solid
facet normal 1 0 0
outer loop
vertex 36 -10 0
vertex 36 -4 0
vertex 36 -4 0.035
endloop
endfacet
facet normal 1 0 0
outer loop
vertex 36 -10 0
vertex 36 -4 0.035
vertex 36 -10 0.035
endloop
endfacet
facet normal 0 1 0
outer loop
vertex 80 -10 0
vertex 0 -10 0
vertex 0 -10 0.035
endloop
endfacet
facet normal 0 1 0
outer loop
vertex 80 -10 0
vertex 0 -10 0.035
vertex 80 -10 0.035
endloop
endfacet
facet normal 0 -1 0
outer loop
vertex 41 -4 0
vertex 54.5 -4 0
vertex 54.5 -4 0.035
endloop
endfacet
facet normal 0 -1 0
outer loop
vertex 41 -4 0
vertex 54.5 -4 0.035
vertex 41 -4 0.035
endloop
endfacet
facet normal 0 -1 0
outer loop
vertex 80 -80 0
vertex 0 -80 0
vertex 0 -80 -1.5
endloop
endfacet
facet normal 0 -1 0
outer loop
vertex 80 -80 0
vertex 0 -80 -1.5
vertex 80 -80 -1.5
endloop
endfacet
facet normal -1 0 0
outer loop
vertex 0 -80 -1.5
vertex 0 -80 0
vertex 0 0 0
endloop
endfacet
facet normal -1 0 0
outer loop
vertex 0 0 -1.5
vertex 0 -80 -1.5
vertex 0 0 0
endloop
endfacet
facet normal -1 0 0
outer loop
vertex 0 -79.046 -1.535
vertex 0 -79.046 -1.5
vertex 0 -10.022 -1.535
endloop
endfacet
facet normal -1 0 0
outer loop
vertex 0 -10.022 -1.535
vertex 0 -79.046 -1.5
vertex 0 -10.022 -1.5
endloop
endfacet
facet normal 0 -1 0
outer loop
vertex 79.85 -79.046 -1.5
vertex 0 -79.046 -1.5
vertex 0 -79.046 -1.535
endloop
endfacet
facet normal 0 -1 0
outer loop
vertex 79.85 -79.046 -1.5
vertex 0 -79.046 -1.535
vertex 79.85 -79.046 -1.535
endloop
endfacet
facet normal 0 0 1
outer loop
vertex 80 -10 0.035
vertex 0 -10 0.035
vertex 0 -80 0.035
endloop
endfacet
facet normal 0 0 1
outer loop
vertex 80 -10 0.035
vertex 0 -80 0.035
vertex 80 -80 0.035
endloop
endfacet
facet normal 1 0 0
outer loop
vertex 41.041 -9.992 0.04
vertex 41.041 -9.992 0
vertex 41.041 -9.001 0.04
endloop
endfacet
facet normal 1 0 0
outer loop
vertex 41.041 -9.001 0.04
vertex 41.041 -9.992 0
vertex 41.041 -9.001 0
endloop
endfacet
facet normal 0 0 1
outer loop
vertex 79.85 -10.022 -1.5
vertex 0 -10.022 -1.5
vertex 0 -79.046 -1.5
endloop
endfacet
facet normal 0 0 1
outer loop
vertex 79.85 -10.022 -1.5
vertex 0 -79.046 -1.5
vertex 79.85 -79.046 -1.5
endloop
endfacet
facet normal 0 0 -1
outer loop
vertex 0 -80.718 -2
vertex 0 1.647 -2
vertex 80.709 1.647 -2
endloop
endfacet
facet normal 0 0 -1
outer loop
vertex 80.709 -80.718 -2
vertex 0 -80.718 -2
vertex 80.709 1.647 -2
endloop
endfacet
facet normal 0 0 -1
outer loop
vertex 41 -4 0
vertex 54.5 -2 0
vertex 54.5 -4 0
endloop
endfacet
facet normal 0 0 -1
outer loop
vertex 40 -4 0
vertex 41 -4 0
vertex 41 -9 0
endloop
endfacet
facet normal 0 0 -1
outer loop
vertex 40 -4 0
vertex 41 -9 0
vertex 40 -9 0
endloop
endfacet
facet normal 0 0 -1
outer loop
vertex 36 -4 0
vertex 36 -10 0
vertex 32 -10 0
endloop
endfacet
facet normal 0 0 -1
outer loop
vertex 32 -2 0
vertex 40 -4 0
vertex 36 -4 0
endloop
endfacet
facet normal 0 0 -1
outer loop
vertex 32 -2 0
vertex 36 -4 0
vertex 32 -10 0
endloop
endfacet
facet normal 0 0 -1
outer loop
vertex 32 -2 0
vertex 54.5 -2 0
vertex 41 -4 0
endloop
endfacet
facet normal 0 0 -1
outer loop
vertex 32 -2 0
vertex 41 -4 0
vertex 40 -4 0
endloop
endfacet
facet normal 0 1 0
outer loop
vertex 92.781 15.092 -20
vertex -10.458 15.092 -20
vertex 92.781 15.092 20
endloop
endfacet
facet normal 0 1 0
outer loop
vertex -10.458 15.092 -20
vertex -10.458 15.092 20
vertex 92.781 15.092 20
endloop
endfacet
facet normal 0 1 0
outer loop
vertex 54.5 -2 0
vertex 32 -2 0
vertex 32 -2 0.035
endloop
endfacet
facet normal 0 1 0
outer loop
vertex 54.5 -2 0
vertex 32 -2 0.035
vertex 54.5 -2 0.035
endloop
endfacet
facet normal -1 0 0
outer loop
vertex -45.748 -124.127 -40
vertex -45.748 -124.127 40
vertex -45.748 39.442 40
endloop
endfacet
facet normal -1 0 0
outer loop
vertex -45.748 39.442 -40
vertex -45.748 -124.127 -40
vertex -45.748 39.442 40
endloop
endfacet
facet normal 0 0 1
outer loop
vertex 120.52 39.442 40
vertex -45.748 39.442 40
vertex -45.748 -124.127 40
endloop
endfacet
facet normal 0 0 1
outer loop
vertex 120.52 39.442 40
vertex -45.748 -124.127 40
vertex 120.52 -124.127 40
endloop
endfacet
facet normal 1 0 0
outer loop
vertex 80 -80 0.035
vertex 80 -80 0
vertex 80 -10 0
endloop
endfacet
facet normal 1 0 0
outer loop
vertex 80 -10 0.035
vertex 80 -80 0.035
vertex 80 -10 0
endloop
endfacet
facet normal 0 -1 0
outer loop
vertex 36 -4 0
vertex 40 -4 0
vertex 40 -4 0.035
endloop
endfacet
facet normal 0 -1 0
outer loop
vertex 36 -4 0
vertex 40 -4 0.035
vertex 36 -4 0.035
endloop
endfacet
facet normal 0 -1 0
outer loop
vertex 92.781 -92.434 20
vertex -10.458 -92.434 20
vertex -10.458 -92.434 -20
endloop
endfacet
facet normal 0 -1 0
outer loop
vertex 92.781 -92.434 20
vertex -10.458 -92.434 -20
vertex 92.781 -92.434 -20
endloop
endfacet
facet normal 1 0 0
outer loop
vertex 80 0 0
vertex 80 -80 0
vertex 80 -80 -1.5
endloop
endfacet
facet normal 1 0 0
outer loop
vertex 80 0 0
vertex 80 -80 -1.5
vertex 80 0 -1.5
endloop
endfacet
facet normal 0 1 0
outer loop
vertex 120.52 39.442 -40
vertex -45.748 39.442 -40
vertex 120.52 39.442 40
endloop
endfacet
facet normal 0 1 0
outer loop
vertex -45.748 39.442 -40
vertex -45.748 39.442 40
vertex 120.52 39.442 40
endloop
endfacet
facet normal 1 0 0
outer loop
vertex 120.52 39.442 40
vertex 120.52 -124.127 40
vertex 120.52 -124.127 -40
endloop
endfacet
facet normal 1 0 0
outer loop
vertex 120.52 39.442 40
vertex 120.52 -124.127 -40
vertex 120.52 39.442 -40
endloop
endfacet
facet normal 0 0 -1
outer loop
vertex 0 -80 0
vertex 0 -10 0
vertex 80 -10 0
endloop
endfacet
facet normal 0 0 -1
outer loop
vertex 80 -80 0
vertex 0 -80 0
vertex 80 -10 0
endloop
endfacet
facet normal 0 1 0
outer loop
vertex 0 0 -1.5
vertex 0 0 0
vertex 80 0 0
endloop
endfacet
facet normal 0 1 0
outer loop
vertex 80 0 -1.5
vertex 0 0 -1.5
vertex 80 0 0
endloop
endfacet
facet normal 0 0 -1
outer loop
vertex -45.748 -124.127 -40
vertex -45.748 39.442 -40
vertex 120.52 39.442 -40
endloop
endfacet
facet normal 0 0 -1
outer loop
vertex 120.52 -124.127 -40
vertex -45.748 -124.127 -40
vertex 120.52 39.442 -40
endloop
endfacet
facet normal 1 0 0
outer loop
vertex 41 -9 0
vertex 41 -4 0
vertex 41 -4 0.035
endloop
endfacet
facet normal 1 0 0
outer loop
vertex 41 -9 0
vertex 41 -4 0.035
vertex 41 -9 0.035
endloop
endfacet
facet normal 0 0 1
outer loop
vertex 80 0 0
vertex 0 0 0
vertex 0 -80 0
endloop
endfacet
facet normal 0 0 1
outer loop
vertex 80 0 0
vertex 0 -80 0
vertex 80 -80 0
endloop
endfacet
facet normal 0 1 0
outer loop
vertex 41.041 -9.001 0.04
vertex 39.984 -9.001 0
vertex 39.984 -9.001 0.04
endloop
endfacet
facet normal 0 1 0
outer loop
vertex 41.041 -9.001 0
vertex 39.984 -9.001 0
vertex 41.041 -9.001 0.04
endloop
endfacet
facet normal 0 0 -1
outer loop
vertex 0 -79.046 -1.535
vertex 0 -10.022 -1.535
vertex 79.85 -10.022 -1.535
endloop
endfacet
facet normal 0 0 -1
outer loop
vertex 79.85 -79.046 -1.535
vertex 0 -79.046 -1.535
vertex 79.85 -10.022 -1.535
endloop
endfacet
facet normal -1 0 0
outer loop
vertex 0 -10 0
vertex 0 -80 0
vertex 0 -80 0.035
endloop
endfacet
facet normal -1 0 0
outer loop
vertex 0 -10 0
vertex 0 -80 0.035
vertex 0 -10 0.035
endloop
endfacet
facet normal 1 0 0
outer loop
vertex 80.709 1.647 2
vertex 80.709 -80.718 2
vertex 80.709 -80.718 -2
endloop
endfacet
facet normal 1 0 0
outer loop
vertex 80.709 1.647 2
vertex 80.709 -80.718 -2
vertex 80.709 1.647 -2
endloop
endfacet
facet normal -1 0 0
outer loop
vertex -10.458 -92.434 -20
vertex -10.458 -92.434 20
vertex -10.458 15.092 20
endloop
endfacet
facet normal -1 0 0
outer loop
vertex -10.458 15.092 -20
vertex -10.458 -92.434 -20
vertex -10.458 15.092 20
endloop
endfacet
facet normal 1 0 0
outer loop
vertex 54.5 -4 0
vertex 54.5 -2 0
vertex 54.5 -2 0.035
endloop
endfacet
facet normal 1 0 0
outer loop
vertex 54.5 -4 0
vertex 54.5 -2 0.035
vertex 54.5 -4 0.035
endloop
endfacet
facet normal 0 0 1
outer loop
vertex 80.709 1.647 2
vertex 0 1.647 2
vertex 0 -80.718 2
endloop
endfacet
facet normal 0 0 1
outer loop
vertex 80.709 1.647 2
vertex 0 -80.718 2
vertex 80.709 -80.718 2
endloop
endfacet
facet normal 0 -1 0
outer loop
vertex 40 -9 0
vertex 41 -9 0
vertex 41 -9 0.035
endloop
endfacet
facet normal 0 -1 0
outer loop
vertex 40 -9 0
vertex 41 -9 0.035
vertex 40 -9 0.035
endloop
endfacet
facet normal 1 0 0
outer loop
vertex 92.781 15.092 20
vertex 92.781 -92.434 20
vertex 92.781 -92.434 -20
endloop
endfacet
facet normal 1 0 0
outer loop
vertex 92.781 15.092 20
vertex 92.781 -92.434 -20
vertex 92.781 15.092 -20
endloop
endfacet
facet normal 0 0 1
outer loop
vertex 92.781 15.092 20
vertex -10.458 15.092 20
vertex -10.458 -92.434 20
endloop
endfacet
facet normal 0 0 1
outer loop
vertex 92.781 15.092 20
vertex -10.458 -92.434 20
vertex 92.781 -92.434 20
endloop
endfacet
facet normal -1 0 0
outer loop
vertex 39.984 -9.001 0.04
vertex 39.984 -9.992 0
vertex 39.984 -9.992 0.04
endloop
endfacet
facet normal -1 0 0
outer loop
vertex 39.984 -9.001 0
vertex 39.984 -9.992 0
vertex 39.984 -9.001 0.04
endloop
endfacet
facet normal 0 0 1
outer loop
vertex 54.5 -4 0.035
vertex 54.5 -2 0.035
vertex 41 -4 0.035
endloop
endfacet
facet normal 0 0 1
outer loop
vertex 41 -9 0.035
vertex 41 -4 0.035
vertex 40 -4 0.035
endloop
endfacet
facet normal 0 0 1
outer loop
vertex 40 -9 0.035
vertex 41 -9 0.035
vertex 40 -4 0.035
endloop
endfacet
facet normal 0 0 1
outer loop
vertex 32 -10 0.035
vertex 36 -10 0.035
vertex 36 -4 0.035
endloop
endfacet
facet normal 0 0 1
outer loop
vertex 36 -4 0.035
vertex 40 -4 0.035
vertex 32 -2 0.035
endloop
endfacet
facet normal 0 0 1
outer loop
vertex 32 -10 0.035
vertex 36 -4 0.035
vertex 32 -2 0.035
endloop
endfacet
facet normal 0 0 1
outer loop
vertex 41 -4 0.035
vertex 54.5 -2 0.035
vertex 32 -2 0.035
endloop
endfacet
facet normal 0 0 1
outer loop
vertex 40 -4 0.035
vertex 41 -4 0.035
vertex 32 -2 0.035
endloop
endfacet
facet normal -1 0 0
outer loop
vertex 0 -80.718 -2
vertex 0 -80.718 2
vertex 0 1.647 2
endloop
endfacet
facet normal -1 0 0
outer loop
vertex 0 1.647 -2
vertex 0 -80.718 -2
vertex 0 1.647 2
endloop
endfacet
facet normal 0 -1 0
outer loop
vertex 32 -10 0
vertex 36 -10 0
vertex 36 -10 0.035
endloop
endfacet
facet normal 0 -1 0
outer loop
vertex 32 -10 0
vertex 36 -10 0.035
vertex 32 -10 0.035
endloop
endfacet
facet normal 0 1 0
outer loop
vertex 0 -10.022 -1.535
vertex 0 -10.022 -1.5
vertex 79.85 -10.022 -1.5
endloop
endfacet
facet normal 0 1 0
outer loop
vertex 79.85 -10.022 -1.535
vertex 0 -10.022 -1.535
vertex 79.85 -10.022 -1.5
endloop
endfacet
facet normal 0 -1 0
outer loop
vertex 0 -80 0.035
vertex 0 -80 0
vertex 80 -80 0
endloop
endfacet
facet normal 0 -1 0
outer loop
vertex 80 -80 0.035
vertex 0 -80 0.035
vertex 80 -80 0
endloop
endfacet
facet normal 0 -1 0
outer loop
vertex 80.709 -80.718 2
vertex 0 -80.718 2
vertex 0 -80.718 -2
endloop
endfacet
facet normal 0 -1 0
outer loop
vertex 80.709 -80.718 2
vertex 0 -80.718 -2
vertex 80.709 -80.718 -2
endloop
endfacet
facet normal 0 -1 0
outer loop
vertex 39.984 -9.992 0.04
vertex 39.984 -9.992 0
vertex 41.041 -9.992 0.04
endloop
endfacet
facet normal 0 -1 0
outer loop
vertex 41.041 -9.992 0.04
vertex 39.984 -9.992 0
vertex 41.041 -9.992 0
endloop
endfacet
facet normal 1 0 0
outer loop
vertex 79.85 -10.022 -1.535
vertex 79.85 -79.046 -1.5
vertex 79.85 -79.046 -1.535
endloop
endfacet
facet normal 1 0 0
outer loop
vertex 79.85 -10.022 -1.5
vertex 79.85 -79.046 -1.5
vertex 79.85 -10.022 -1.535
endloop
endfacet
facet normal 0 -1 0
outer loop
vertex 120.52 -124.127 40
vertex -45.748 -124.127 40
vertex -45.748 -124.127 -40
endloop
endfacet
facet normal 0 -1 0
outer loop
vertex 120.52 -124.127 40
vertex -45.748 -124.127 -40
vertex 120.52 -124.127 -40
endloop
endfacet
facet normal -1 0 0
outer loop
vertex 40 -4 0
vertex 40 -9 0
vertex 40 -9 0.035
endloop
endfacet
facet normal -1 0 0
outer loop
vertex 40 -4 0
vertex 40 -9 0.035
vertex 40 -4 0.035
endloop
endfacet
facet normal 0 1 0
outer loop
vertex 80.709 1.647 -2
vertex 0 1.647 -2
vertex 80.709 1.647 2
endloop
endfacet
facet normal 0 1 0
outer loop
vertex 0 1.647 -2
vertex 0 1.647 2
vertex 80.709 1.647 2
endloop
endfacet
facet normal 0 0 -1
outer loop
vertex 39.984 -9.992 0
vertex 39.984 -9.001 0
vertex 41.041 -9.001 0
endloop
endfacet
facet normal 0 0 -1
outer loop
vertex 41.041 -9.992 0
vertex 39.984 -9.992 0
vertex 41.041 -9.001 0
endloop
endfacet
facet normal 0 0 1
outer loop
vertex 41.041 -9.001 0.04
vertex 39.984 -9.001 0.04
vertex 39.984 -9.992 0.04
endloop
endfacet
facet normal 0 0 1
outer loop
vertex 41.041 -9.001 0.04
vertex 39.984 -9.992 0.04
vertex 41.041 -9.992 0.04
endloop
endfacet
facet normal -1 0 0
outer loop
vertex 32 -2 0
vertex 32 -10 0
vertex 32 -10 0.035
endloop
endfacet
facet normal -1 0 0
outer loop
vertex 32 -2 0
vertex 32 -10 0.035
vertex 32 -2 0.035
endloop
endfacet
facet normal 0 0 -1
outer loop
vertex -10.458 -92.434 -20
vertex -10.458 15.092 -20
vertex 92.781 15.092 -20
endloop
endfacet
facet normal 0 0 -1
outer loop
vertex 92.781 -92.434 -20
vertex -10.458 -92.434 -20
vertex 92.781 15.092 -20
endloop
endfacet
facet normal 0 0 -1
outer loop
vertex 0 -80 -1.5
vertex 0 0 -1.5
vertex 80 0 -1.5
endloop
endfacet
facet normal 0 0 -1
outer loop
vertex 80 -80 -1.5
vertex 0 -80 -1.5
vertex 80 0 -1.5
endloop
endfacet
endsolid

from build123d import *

# Parameters (mm, degrees)
SKETCH_W         = 80
SKETCH_H         = 80
EXTRUDE_DEPTH    = 1.5
EXTRUDE001_DEPTH = 0.035
SKETCH003_W      = 1.05783
SKETCH003_H      = 0.990667
EXTRUDE002_DEPTH = 0.04
SKETCH002_W      = 80
SKETCH002_H      = 70
EXTRUDE003_DEPTH = 0.035
SKETCH006_W      = 103.239367
SKETCH006_H      = 107.526126
EXTRUDE006_DEPTH = 20
SKETCH007_W      = 79.849655
SKETCH007_H      = 69.024075
EXTRUDE007_DEPTH = 0.035
SKETCH009_W      = 166.267383
SKETCH009_H      = 163.569344
EXTRUDE008_DEPTH = 40
SKETCH010_W      = 80.709038
SKETCH010_H      = 82.365145
EXTRUDE009_DEPTH = 2


with BuildPart() as substrate:
    # Sketch → Extrude (new body)
    with BuildSketch(Plane.XY):
        with Locations((40, -40)):
            Rectangle(SKETCH_W, SKETCH_H)
    extrude(amount=-EXTRUDE_DEPTH)


with BuildPart() as antenna_patch:
    # Sketch001 → Extrude001 (new body)
    with BuildSketch(Plane.XY):
        Polygon((32, -2), (54.5, -2), (54.5, -4), (41, -4), (41, -9), (40, -9), (40, -4), (36, -4), (36, -10), (32, -10), align=None)
    extrude(amount=EXTRUDE001_DEPTH)


with BuildPart() as portin:
    # Sketch003 → Extrude002 (new body)
    with BuildSketch(Plane.XY):
        with Locations((40.512497, -9.496429)):
            Rectangle(SKETCH003_W, SKETCH003_H)
    extrude(amount=EXTRUDE002_DEPTH)


with BuildPart() as top_gnd_patch:
    # Sketch002 → Extrude003 (new body)
    with BuildSketch(Plane.XY):
        with Locations((40, -45)):
            Rectangle(SKETCH002_W, SKETCH002_H)
    extrude(amount=EXTRUDE003_DEPTH)


with BuildPart() as radiationbox:
    # Sketch006 → Extrude006 (new body, symmetric)
    with BuildSketch(Plane.XY):
        with Locations((41.161642, -38.670676)):
            Rectangle(SKETCH006_W, SKETCH006_H)
    extrude(amount=EXTRUDE006_DEPTH, both=True)


with BuildPart() as bottom_gnd_patch:
    # Sketch007 → Extrude007 (new body)
    with BuildSketch(Plane.XY.offset(-1.5)):
        with Locations((39.924827, -44.533693)):
            Rectangle(SKETCH007_W, SKETCH007_H)
    extrude(amount=-EXTRUDE007_DEPTH)


with BuildPart() as airbox:
    # Sketch009 → Extrude008 (new body, symmetric)
    with BuildSketch(Plane.XY):
        with Locations((37.386167, -42.342373)):
            Rectangle(SKETCH009_W, SKETCH009_H)
    extrude(amount=EXTRUDE008_DEPTH, both=True)


with BuildPart() as simulationmodelbox:
    # Sketch010 → Extrude009 (new body, symmetric)
    with BuildSketch(Plane.XY):
        with Locations((40.354519, -39.535255)):
            Rectangle(SKETCH010_W, SKETCH010_H)
    extrude(amount=EXTRUDE009_DEPTH, both=True)


solid = Compound([substrate.part, antenna_patch.part, portin.part, top_gnd_patch.part, radiationbox.part, bottom_gnd_patch.part, airbox.part, simulationmodelbox.part])
